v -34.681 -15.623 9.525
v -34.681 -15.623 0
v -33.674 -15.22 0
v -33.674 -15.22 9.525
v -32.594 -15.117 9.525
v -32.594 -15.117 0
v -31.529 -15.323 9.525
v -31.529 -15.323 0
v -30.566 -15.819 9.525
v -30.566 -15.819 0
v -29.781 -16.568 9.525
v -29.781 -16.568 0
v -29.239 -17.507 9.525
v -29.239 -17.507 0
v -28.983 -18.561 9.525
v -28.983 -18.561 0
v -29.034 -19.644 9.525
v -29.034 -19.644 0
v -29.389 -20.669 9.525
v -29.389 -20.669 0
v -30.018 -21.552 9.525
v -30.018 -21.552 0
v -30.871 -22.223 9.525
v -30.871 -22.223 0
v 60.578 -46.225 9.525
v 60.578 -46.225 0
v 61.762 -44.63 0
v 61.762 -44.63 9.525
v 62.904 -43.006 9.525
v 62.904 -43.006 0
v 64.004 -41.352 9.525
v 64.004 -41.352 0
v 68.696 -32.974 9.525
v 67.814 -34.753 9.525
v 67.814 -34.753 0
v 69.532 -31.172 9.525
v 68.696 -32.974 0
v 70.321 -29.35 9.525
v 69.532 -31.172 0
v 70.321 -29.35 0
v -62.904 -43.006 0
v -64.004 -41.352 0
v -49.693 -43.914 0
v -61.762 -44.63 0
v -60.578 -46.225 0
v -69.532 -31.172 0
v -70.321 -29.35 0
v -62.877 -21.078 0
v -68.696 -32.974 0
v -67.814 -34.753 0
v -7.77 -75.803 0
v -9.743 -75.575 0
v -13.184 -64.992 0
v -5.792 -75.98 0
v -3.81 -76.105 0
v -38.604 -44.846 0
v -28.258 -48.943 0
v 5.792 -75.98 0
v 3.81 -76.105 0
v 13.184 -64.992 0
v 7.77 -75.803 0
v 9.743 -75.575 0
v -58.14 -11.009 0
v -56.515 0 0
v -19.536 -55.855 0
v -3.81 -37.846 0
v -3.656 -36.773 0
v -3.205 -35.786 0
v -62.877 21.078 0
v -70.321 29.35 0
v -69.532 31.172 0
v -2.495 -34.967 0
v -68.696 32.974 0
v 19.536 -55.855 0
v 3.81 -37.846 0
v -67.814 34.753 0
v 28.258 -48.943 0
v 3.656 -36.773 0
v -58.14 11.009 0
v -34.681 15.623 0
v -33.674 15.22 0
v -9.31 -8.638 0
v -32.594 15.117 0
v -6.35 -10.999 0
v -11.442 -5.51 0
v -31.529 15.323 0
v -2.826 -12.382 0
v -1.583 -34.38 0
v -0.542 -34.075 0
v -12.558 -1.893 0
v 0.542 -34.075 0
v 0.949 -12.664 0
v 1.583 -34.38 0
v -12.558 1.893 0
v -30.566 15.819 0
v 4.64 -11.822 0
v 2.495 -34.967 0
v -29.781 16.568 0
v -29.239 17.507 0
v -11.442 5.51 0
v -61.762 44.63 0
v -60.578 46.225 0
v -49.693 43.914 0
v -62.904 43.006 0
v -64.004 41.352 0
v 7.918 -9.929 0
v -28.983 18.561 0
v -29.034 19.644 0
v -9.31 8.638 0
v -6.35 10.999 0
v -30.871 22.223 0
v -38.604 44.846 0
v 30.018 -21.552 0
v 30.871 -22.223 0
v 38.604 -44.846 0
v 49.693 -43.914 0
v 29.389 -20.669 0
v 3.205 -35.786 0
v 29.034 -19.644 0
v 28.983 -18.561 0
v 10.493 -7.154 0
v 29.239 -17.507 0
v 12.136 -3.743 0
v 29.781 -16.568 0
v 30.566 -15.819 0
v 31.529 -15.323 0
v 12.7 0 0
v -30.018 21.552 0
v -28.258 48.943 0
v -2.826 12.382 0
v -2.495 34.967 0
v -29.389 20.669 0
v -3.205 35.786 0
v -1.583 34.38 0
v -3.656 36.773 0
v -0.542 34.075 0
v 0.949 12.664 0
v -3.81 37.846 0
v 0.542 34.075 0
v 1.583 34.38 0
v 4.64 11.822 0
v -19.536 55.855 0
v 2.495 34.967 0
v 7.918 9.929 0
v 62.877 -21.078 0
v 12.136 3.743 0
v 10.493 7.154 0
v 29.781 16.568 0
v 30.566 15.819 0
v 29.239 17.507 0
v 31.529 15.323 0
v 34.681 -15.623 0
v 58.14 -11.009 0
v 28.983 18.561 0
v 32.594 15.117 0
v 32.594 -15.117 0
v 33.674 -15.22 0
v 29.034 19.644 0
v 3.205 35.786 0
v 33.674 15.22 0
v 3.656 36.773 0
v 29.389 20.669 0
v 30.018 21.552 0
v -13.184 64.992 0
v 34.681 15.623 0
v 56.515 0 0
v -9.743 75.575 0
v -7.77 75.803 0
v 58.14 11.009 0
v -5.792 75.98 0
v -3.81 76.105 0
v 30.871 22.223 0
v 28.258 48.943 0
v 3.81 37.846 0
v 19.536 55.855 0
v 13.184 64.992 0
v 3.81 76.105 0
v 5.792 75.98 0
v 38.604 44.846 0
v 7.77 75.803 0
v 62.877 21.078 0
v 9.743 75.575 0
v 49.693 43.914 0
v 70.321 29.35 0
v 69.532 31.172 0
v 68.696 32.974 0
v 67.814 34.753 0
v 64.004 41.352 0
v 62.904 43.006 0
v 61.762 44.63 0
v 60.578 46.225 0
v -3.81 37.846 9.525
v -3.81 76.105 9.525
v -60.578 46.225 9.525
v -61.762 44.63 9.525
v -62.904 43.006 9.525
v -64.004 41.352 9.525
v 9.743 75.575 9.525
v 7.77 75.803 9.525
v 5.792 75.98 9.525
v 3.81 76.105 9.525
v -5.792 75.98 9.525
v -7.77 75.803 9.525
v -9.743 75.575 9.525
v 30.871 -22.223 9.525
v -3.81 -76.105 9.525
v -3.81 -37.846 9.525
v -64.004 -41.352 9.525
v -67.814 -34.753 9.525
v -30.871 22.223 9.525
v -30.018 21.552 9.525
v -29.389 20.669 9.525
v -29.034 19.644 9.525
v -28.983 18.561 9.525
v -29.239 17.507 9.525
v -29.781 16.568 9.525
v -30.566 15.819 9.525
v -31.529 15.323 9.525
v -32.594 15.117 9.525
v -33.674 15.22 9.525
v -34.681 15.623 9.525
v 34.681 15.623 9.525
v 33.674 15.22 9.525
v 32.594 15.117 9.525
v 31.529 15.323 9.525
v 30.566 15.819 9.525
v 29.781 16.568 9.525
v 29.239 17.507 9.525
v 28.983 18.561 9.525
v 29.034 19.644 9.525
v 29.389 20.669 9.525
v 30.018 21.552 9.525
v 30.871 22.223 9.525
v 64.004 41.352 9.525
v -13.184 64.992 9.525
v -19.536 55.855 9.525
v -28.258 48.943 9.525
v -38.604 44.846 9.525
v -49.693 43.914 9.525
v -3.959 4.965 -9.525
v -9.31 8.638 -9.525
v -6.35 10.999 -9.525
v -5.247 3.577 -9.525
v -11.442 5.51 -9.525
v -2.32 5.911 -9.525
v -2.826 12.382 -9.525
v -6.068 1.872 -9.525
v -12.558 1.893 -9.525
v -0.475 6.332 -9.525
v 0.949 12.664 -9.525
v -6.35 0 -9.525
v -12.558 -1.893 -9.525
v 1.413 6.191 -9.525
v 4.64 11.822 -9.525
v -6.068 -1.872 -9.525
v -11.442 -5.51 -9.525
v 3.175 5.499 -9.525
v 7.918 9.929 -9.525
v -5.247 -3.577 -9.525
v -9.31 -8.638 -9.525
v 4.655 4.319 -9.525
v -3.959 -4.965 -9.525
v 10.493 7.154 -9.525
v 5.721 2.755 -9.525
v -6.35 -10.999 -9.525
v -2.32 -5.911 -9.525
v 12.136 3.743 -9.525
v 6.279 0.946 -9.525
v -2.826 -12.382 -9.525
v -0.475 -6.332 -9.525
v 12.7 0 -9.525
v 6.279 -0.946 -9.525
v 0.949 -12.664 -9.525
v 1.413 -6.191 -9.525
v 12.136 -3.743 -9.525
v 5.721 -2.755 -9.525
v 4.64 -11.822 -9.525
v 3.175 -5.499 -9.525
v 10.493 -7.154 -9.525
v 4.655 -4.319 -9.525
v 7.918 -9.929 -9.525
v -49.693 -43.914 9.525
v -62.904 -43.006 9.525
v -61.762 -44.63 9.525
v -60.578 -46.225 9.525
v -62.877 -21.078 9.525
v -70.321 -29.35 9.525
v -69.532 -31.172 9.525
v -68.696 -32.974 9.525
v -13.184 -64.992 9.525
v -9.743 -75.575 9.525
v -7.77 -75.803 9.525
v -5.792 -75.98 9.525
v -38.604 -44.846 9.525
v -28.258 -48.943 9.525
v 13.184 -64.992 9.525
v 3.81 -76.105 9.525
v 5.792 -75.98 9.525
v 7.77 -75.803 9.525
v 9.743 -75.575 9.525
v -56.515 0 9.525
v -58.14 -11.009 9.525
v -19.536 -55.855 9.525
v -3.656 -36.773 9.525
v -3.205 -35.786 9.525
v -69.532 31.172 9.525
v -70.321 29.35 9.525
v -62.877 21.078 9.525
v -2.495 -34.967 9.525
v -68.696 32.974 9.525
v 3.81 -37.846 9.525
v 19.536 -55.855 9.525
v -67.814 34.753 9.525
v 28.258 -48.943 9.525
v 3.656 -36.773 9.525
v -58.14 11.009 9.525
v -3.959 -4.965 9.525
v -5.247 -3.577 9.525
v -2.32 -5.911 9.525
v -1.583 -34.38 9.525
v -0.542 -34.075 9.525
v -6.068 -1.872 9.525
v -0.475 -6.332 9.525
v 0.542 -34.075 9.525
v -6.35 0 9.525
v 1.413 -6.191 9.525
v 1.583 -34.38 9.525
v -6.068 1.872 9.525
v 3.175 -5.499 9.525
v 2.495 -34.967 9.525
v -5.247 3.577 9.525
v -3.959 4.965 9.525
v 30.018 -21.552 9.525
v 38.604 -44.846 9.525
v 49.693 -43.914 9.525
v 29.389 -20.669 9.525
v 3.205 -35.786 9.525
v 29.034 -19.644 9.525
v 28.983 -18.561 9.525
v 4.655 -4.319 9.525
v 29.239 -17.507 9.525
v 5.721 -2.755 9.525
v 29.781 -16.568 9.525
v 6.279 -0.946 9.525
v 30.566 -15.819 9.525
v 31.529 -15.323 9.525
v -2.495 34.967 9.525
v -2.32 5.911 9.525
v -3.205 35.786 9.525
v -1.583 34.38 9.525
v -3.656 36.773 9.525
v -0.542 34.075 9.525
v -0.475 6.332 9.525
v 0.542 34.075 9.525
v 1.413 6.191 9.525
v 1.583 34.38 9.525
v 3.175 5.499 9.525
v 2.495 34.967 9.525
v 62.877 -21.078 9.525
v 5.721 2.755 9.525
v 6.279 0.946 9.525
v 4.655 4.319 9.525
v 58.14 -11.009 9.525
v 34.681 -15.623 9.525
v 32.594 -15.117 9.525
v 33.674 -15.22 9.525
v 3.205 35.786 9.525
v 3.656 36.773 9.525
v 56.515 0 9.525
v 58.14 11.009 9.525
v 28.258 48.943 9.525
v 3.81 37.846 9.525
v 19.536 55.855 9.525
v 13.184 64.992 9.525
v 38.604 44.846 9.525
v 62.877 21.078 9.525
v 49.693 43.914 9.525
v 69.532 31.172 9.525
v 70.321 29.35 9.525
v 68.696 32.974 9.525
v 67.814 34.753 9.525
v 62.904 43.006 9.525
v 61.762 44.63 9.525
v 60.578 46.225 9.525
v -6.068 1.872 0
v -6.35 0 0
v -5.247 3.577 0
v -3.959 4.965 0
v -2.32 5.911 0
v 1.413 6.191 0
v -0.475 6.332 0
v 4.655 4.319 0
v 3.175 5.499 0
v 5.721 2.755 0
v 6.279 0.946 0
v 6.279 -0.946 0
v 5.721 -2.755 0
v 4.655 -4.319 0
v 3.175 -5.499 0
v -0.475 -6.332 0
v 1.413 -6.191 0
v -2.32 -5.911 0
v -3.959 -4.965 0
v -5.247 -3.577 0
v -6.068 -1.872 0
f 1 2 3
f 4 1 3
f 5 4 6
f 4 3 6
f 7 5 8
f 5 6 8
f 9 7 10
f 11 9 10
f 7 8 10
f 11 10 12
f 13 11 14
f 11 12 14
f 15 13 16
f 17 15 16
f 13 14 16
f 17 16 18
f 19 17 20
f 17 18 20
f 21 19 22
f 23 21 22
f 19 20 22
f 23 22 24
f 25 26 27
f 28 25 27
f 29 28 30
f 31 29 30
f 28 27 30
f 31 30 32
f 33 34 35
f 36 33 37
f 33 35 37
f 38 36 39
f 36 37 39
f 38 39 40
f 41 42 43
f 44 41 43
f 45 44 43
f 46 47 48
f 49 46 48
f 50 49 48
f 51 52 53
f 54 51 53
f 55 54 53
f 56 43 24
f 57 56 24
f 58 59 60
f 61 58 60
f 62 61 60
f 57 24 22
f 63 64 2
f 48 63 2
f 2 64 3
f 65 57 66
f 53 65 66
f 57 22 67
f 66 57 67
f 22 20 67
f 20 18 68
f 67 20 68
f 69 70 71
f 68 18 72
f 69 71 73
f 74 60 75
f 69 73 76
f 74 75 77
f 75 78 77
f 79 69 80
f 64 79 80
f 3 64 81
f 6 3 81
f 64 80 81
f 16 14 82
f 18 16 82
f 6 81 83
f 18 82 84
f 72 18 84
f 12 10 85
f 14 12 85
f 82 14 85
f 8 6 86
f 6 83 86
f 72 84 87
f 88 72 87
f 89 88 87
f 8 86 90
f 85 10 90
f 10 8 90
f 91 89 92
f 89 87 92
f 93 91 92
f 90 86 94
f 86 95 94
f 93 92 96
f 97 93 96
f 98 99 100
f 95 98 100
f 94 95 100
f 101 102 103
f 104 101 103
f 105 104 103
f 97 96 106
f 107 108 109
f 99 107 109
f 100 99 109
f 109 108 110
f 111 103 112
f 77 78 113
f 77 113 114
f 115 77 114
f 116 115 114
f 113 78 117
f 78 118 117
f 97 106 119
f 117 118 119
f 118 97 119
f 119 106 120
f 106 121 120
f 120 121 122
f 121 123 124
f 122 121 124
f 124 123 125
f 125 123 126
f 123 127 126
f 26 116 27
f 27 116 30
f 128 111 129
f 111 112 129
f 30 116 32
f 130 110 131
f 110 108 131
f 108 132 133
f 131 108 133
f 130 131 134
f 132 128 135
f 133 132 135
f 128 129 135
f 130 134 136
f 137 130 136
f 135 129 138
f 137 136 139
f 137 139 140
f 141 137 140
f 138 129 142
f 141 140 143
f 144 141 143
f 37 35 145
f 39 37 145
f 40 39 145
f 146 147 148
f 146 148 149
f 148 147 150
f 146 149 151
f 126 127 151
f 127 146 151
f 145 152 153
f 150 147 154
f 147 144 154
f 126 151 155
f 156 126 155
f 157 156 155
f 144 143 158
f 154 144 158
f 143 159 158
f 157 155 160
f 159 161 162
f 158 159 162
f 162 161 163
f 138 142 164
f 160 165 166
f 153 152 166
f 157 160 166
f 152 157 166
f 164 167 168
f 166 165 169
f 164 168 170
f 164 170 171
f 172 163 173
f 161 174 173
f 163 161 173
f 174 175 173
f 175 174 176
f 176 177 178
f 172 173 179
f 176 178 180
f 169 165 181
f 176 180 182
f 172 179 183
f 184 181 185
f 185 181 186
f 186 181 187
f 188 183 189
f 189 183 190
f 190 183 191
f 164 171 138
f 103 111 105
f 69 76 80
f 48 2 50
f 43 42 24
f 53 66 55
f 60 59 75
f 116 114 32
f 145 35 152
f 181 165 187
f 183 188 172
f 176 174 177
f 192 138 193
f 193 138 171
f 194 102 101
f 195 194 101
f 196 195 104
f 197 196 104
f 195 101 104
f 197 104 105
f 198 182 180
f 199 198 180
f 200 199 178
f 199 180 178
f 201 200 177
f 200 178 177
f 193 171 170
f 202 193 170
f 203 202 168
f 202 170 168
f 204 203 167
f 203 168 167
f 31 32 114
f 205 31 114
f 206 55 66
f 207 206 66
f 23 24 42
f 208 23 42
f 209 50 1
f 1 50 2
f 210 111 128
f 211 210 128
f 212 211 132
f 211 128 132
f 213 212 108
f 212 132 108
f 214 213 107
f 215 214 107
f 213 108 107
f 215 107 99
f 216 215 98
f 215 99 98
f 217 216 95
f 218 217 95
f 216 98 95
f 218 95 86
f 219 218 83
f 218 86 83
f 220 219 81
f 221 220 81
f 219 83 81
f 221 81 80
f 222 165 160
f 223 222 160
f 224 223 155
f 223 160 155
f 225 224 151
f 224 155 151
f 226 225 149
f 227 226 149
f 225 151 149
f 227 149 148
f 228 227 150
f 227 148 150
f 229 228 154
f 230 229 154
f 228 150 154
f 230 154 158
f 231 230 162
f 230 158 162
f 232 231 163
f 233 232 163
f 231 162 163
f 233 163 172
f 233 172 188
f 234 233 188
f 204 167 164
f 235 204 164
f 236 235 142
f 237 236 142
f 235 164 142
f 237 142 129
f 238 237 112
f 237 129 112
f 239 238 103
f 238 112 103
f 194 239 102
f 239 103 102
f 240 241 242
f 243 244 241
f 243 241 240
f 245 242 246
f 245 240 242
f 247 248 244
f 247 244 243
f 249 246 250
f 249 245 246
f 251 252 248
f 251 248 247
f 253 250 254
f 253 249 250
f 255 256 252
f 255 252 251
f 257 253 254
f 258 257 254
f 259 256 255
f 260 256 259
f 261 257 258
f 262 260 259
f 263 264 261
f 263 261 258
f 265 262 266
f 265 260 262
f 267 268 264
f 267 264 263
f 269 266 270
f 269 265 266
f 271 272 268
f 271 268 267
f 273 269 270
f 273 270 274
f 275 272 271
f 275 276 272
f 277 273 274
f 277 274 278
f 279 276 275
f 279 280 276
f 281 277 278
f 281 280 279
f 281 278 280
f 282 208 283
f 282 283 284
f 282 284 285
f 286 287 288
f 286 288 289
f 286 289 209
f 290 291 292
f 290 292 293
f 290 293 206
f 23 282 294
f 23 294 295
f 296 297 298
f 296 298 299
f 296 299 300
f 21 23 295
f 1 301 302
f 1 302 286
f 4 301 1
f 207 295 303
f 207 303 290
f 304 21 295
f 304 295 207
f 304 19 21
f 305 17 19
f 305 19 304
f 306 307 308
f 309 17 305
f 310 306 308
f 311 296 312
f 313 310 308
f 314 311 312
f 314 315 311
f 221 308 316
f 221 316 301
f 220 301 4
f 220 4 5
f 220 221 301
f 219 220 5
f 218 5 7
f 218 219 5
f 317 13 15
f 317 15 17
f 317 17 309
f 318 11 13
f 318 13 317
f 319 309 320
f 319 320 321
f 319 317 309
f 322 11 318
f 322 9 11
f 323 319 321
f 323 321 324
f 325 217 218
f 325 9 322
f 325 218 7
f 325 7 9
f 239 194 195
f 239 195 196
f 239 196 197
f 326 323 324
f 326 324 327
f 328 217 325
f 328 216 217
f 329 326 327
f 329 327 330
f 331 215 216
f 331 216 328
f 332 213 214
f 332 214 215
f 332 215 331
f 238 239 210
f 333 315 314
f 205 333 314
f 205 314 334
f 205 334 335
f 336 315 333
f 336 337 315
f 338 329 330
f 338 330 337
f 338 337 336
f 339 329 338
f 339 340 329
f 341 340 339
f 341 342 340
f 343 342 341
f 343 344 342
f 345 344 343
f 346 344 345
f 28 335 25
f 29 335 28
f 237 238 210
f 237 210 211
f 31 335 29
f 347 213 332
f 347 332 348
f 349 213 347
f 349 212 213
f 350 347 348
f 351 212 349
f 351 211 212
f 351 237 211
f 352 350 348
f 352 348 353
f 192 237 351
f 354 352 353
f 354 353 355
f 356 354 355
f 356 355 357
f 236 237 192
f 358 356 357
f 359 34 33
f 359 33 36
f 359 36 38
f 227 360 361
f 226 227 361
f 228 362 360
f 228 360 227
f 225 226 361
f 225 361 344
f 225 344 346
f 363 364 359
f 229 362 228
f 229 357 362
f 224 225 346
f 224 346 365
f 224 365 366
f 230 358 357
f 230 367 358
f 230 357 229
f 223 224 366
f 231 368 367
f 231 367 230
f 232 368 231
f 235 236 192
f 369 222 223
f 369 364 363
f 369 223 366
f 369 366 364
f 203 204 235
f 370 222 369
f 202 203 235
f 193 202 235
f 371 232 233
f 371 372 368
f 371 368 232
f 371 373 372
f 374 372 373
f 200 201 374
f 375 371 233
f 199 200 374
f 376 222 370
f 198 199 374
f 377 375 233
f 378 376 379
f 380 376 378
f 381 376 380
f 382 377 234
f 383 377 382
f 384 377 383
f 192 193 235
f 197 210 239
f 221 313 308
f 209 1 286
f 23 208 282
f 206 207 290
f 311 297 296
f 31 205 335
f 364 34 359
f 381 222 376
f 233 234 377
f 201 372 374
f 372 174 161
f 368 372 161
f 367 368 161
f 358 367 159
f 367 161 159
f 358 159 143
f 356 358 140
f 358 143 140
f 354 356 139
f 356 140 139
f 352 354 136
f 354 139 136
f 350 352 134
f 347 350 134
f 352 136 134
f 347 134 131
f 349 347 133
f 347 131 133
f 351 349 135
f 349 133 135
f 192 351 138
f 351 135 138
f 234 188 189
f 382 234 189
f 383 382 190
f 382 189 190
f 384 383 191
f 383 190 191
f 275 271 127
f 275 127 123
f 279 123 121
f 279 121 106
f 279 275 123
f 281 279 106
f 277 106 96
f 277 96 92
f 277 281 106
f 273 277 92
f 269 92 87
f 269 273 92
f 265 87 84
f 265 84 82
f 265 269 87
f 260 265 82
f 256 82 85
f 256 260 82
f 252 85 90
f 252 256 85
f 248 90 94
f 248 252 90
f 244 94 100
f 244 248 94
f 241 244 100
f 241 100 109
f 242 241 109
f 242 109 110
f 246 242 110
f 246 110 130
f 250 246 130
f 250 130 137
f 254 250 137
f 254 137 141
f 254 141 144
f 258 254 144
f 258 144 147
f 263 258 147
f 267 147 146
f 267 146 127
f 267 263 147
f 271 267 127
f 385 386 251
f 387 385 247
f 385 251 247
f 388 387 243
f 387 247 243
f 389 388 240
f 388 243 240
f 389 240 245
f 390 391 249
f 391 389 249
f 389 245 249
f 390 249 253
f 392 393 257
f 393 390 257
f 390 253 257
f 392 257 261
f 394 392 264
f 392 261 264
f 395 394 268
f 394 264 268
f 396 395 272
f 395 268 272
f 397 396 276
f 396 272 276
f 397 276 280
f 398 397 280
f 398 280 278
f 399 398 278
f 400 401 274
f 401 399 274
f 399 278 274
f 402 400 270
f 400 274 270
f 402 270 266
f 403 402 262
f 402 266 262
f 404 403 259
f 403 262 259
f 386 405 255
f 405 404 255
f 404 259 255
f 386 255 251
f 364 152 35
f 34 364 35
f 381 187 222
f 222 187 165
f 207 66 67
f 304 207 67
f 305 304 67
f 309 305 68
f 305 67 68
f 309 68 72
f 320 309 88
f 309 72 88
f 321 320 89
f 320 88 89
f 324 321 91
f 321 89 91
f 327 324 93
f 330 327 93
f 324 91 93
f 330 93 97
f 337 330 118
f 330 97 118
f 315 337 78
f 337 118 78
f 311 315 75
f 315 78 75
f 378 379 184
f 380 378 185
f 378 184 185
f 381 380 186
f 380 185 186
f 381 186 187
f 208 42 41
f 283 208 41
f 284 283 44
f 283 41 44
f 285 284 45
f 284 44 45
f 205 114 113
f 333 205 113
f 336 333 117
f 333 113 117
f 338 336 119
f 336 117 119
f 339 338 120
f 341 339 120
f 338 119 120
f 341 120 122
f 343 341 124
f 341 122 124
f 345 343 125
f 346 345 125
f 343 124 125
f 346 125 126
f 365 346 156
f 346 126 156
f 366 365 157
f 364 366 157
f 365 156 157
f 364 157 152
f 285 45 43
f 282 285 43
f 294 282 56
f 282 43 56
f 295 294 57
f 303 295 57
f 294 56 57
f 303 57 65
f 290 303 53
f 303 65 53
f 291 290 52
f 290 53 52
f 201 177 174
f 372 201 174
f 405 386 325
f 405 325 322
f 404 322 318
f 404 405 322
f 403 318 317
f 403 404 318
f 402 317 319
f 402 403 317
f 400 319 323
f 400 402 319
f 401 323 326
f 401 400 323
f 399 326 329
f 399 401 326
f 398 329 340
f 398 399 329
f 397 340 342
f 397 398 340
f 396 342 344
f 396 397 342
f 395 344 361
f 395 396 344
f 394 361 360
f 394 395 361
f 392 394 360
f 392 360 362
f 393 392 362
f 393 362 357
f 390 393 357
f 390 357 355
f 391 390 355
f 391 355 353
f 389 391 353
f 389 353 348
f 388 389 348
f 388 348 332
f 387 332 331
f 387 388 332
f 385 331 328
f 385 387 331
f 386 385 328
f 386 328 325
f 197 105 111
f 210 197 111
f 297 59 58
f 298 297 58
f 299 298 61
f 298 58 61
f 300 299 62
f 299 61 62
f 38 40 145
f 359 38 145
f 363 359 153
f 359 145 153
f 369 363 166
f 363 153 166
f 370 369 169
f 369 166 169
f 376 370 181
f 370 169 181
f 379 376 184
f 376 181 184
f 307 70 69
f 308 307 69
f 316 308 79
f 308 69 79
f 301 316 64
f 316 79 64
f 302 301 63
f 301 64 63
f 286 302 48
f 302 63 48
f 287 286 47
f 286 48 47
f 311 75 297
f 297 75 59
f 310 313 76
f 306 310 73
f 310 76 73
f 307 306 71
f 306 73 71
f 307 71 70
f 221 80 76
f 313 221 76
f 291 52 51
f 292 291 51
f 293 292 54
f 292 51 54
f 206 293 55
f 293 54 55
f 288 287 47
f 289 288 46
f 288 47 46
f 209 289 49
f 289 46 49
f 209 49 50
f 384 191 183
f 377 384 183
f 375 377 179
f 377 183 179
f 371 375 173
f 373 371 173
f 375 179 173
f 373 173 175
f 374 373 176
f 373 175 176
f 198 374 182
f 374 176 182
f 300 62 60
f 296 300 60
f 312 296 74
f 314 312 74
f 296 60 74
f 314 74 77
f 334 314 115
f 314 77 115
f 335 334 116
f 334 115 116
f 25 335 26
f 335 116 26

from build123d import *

# Parameters (mm, degrees)
SKETCH2_R           = 6.35
BOSS_EXTRUDE1_DEPTH = 9.525
BOSS_EXTRUDE2_START = 9.525
SKETCH3_R           = 12.7
SKETCH3_R_2         = 6.35
BOSS_EXTRUDE2_DEPTH = 9.525


with BuildPart() as part:
    # Sketch2 → Boss-Extrude1 (new body)
    with BuildSketch(Plane.XY):
        with BuildLine():
            Line((-3.81, 37.846), (-3.81, 76.104690394))
            ThreePointArc((-3.81, 76.104690394), (-6.781597981, 75.897627953), (-9.742832479, 75.574580484))
            ThreePointArc((-9.742832479, 75.574580484), (-28.2575, 48.943425695), (-60.57809034, 46.224830674))
            ThreePointArc((-60.57809034, 46.224830674), (-62.338474903, 43.821850106), (-64.003595229, 41.351901986))
            Line((-64.003595229, 41.351901986), (-30.870597432, 22.222556788))
            ThreePointArc((-30.870597432, 22.222556788), (-29.476040643, 17.018), (-34.680597432, 15.623443212))
            Line((-34.680597432, 15.623443212), (-67.813595229, 34.752788409))
            ThreePointArc((-67.813595229, 34.752788409), (-69.120072885, 32.075777846), (-70.320922819, 29.34974981))
            ThreePointArc((-70.320922819, 29.34974981), (-56.515, 0), (-70.320922819, -29.34974981))
            ThreePointArc((-70.320922819, -29.34974981), (-69.120072885, -32.075777846), (-67.813595229, -34.752788409))
            Line((-67.813595229, -34.752788409), (-34.680597432, -15.623443212))
            ThreePointArc((-34.680597432, -15.623443212), (-29.476040643, -17.018), (-30.870597432, -22.222556788))
            Line((-30.870597432, -22.222556788), (-64.003595229, -41.351901986))
            ThreePointArc((-64.003595229, -41.351901986), (-62.338474903, -43.821850106), (-60.57809034, -46.224830674))
            ThreePointArc((-60.57809034, -46.224830674), (-28.2575, -48.943425695), (-9.742832479, -75.574580484))
            ThreePointArc((-9.742832479, -75.574580484), (-6.781597981, -75.897627953), (-3.81, -76.104690394))
            Line((-3.81, -76.104690394), (-3.81, -37.846))
            ThreePointArc((-3.81, -37.846), (0, -34.036), (3.81, -37.846))
            Line((3.81, -37.846), (3.81, -76.104690394))
            ThreePointArc((3.81, -76.104690394), (6.781597981, -75.897627953), (9.742832479, -75.574580484))
            ThreePointArc((9.742832479, -75.574580484), (28.2575, -48.943425695), (60.57809034, -46.224830674))
            ThreePointArc((60.57809034, -46.224830674), (62.338474903, -43.821850106), (64.003595229, -41.351901986))
            Line((64.003595229, -41.351901986), (30.870597432, -22.222556788))
            ThreePointArc((30.870597432, -22.222556788), (29.476040643, -17.018), (34.680597432, -15.623443212))
            Line((34.680597432, -15.623443212), (67.813595229, -34.752788409))
            ThreePointArc((67.813595229, -34.752788409), (69.120072885, -32.075777846), (70.320922819, -29.34974981))
            ThreePointArc((70.320922819, -29.34974981), (56.515, 0), (70.320922819, 29.34974981))
            ThreePointArc((70.320922819, 29.34974981), (69.120072885, 32.075777846), (67.813595229, 34.752788409))
            Line((67.813595229, 34.752788409), (34.680597432, 15.623443212))
            ThreePointArc((34.680597432, 15.623443212), (29.476040643, 17.018), (30.870597432, 22.222556788))
            Line((30.870597432, 22.222556788), (64.003595229, 41.351901986))
            ThreePointArc((64.003595229, 41.351901986), (62.338474903, 43.821850106), (60.57809034, 46.224830674))
            ThreePointArc((60.57809034, 46.224830674), (28.2575, 48.943425695), (9.742832479, 75.574580484))
            ThreePointArc((9.742832479, 75.574580484), (6.781597981, 75.897627953), (3.81, 76.104690394))
            Line((3.81, 76.104690394), (3.81, 37.846))
            ThreePointArc((3.81, 37.846), (0, 34.036), (-3.81, 37.846))
        make_face()
        with Locations(Location((0, 0, 0), (0, 0, 180))):
            Circle(SKETCH2_R, mode=Mode.SUBTRACT)
    extrude(amount=BOSS_EXTRUDE1_DEPTH)

    # Sketch3 → Boss-Extrude2 (add)
    with BuildSketch(Plane(origin=(0, 0, 0), x_dir=(-1, 0, 0), z_dir=(0, 0, -1)).offset(BOSS_EXTRUDE2_START)):
        with Locations(Location((0, 0, 0), (0, 0, 180))):
            Circle(SKETCH3_R)
        Circle(SKETCH3_R_2, mode=Mode.SUBTRACT)
    extrude(amount=-BOSS_EXTRUDE2_DEPTH)


solid = part.part
